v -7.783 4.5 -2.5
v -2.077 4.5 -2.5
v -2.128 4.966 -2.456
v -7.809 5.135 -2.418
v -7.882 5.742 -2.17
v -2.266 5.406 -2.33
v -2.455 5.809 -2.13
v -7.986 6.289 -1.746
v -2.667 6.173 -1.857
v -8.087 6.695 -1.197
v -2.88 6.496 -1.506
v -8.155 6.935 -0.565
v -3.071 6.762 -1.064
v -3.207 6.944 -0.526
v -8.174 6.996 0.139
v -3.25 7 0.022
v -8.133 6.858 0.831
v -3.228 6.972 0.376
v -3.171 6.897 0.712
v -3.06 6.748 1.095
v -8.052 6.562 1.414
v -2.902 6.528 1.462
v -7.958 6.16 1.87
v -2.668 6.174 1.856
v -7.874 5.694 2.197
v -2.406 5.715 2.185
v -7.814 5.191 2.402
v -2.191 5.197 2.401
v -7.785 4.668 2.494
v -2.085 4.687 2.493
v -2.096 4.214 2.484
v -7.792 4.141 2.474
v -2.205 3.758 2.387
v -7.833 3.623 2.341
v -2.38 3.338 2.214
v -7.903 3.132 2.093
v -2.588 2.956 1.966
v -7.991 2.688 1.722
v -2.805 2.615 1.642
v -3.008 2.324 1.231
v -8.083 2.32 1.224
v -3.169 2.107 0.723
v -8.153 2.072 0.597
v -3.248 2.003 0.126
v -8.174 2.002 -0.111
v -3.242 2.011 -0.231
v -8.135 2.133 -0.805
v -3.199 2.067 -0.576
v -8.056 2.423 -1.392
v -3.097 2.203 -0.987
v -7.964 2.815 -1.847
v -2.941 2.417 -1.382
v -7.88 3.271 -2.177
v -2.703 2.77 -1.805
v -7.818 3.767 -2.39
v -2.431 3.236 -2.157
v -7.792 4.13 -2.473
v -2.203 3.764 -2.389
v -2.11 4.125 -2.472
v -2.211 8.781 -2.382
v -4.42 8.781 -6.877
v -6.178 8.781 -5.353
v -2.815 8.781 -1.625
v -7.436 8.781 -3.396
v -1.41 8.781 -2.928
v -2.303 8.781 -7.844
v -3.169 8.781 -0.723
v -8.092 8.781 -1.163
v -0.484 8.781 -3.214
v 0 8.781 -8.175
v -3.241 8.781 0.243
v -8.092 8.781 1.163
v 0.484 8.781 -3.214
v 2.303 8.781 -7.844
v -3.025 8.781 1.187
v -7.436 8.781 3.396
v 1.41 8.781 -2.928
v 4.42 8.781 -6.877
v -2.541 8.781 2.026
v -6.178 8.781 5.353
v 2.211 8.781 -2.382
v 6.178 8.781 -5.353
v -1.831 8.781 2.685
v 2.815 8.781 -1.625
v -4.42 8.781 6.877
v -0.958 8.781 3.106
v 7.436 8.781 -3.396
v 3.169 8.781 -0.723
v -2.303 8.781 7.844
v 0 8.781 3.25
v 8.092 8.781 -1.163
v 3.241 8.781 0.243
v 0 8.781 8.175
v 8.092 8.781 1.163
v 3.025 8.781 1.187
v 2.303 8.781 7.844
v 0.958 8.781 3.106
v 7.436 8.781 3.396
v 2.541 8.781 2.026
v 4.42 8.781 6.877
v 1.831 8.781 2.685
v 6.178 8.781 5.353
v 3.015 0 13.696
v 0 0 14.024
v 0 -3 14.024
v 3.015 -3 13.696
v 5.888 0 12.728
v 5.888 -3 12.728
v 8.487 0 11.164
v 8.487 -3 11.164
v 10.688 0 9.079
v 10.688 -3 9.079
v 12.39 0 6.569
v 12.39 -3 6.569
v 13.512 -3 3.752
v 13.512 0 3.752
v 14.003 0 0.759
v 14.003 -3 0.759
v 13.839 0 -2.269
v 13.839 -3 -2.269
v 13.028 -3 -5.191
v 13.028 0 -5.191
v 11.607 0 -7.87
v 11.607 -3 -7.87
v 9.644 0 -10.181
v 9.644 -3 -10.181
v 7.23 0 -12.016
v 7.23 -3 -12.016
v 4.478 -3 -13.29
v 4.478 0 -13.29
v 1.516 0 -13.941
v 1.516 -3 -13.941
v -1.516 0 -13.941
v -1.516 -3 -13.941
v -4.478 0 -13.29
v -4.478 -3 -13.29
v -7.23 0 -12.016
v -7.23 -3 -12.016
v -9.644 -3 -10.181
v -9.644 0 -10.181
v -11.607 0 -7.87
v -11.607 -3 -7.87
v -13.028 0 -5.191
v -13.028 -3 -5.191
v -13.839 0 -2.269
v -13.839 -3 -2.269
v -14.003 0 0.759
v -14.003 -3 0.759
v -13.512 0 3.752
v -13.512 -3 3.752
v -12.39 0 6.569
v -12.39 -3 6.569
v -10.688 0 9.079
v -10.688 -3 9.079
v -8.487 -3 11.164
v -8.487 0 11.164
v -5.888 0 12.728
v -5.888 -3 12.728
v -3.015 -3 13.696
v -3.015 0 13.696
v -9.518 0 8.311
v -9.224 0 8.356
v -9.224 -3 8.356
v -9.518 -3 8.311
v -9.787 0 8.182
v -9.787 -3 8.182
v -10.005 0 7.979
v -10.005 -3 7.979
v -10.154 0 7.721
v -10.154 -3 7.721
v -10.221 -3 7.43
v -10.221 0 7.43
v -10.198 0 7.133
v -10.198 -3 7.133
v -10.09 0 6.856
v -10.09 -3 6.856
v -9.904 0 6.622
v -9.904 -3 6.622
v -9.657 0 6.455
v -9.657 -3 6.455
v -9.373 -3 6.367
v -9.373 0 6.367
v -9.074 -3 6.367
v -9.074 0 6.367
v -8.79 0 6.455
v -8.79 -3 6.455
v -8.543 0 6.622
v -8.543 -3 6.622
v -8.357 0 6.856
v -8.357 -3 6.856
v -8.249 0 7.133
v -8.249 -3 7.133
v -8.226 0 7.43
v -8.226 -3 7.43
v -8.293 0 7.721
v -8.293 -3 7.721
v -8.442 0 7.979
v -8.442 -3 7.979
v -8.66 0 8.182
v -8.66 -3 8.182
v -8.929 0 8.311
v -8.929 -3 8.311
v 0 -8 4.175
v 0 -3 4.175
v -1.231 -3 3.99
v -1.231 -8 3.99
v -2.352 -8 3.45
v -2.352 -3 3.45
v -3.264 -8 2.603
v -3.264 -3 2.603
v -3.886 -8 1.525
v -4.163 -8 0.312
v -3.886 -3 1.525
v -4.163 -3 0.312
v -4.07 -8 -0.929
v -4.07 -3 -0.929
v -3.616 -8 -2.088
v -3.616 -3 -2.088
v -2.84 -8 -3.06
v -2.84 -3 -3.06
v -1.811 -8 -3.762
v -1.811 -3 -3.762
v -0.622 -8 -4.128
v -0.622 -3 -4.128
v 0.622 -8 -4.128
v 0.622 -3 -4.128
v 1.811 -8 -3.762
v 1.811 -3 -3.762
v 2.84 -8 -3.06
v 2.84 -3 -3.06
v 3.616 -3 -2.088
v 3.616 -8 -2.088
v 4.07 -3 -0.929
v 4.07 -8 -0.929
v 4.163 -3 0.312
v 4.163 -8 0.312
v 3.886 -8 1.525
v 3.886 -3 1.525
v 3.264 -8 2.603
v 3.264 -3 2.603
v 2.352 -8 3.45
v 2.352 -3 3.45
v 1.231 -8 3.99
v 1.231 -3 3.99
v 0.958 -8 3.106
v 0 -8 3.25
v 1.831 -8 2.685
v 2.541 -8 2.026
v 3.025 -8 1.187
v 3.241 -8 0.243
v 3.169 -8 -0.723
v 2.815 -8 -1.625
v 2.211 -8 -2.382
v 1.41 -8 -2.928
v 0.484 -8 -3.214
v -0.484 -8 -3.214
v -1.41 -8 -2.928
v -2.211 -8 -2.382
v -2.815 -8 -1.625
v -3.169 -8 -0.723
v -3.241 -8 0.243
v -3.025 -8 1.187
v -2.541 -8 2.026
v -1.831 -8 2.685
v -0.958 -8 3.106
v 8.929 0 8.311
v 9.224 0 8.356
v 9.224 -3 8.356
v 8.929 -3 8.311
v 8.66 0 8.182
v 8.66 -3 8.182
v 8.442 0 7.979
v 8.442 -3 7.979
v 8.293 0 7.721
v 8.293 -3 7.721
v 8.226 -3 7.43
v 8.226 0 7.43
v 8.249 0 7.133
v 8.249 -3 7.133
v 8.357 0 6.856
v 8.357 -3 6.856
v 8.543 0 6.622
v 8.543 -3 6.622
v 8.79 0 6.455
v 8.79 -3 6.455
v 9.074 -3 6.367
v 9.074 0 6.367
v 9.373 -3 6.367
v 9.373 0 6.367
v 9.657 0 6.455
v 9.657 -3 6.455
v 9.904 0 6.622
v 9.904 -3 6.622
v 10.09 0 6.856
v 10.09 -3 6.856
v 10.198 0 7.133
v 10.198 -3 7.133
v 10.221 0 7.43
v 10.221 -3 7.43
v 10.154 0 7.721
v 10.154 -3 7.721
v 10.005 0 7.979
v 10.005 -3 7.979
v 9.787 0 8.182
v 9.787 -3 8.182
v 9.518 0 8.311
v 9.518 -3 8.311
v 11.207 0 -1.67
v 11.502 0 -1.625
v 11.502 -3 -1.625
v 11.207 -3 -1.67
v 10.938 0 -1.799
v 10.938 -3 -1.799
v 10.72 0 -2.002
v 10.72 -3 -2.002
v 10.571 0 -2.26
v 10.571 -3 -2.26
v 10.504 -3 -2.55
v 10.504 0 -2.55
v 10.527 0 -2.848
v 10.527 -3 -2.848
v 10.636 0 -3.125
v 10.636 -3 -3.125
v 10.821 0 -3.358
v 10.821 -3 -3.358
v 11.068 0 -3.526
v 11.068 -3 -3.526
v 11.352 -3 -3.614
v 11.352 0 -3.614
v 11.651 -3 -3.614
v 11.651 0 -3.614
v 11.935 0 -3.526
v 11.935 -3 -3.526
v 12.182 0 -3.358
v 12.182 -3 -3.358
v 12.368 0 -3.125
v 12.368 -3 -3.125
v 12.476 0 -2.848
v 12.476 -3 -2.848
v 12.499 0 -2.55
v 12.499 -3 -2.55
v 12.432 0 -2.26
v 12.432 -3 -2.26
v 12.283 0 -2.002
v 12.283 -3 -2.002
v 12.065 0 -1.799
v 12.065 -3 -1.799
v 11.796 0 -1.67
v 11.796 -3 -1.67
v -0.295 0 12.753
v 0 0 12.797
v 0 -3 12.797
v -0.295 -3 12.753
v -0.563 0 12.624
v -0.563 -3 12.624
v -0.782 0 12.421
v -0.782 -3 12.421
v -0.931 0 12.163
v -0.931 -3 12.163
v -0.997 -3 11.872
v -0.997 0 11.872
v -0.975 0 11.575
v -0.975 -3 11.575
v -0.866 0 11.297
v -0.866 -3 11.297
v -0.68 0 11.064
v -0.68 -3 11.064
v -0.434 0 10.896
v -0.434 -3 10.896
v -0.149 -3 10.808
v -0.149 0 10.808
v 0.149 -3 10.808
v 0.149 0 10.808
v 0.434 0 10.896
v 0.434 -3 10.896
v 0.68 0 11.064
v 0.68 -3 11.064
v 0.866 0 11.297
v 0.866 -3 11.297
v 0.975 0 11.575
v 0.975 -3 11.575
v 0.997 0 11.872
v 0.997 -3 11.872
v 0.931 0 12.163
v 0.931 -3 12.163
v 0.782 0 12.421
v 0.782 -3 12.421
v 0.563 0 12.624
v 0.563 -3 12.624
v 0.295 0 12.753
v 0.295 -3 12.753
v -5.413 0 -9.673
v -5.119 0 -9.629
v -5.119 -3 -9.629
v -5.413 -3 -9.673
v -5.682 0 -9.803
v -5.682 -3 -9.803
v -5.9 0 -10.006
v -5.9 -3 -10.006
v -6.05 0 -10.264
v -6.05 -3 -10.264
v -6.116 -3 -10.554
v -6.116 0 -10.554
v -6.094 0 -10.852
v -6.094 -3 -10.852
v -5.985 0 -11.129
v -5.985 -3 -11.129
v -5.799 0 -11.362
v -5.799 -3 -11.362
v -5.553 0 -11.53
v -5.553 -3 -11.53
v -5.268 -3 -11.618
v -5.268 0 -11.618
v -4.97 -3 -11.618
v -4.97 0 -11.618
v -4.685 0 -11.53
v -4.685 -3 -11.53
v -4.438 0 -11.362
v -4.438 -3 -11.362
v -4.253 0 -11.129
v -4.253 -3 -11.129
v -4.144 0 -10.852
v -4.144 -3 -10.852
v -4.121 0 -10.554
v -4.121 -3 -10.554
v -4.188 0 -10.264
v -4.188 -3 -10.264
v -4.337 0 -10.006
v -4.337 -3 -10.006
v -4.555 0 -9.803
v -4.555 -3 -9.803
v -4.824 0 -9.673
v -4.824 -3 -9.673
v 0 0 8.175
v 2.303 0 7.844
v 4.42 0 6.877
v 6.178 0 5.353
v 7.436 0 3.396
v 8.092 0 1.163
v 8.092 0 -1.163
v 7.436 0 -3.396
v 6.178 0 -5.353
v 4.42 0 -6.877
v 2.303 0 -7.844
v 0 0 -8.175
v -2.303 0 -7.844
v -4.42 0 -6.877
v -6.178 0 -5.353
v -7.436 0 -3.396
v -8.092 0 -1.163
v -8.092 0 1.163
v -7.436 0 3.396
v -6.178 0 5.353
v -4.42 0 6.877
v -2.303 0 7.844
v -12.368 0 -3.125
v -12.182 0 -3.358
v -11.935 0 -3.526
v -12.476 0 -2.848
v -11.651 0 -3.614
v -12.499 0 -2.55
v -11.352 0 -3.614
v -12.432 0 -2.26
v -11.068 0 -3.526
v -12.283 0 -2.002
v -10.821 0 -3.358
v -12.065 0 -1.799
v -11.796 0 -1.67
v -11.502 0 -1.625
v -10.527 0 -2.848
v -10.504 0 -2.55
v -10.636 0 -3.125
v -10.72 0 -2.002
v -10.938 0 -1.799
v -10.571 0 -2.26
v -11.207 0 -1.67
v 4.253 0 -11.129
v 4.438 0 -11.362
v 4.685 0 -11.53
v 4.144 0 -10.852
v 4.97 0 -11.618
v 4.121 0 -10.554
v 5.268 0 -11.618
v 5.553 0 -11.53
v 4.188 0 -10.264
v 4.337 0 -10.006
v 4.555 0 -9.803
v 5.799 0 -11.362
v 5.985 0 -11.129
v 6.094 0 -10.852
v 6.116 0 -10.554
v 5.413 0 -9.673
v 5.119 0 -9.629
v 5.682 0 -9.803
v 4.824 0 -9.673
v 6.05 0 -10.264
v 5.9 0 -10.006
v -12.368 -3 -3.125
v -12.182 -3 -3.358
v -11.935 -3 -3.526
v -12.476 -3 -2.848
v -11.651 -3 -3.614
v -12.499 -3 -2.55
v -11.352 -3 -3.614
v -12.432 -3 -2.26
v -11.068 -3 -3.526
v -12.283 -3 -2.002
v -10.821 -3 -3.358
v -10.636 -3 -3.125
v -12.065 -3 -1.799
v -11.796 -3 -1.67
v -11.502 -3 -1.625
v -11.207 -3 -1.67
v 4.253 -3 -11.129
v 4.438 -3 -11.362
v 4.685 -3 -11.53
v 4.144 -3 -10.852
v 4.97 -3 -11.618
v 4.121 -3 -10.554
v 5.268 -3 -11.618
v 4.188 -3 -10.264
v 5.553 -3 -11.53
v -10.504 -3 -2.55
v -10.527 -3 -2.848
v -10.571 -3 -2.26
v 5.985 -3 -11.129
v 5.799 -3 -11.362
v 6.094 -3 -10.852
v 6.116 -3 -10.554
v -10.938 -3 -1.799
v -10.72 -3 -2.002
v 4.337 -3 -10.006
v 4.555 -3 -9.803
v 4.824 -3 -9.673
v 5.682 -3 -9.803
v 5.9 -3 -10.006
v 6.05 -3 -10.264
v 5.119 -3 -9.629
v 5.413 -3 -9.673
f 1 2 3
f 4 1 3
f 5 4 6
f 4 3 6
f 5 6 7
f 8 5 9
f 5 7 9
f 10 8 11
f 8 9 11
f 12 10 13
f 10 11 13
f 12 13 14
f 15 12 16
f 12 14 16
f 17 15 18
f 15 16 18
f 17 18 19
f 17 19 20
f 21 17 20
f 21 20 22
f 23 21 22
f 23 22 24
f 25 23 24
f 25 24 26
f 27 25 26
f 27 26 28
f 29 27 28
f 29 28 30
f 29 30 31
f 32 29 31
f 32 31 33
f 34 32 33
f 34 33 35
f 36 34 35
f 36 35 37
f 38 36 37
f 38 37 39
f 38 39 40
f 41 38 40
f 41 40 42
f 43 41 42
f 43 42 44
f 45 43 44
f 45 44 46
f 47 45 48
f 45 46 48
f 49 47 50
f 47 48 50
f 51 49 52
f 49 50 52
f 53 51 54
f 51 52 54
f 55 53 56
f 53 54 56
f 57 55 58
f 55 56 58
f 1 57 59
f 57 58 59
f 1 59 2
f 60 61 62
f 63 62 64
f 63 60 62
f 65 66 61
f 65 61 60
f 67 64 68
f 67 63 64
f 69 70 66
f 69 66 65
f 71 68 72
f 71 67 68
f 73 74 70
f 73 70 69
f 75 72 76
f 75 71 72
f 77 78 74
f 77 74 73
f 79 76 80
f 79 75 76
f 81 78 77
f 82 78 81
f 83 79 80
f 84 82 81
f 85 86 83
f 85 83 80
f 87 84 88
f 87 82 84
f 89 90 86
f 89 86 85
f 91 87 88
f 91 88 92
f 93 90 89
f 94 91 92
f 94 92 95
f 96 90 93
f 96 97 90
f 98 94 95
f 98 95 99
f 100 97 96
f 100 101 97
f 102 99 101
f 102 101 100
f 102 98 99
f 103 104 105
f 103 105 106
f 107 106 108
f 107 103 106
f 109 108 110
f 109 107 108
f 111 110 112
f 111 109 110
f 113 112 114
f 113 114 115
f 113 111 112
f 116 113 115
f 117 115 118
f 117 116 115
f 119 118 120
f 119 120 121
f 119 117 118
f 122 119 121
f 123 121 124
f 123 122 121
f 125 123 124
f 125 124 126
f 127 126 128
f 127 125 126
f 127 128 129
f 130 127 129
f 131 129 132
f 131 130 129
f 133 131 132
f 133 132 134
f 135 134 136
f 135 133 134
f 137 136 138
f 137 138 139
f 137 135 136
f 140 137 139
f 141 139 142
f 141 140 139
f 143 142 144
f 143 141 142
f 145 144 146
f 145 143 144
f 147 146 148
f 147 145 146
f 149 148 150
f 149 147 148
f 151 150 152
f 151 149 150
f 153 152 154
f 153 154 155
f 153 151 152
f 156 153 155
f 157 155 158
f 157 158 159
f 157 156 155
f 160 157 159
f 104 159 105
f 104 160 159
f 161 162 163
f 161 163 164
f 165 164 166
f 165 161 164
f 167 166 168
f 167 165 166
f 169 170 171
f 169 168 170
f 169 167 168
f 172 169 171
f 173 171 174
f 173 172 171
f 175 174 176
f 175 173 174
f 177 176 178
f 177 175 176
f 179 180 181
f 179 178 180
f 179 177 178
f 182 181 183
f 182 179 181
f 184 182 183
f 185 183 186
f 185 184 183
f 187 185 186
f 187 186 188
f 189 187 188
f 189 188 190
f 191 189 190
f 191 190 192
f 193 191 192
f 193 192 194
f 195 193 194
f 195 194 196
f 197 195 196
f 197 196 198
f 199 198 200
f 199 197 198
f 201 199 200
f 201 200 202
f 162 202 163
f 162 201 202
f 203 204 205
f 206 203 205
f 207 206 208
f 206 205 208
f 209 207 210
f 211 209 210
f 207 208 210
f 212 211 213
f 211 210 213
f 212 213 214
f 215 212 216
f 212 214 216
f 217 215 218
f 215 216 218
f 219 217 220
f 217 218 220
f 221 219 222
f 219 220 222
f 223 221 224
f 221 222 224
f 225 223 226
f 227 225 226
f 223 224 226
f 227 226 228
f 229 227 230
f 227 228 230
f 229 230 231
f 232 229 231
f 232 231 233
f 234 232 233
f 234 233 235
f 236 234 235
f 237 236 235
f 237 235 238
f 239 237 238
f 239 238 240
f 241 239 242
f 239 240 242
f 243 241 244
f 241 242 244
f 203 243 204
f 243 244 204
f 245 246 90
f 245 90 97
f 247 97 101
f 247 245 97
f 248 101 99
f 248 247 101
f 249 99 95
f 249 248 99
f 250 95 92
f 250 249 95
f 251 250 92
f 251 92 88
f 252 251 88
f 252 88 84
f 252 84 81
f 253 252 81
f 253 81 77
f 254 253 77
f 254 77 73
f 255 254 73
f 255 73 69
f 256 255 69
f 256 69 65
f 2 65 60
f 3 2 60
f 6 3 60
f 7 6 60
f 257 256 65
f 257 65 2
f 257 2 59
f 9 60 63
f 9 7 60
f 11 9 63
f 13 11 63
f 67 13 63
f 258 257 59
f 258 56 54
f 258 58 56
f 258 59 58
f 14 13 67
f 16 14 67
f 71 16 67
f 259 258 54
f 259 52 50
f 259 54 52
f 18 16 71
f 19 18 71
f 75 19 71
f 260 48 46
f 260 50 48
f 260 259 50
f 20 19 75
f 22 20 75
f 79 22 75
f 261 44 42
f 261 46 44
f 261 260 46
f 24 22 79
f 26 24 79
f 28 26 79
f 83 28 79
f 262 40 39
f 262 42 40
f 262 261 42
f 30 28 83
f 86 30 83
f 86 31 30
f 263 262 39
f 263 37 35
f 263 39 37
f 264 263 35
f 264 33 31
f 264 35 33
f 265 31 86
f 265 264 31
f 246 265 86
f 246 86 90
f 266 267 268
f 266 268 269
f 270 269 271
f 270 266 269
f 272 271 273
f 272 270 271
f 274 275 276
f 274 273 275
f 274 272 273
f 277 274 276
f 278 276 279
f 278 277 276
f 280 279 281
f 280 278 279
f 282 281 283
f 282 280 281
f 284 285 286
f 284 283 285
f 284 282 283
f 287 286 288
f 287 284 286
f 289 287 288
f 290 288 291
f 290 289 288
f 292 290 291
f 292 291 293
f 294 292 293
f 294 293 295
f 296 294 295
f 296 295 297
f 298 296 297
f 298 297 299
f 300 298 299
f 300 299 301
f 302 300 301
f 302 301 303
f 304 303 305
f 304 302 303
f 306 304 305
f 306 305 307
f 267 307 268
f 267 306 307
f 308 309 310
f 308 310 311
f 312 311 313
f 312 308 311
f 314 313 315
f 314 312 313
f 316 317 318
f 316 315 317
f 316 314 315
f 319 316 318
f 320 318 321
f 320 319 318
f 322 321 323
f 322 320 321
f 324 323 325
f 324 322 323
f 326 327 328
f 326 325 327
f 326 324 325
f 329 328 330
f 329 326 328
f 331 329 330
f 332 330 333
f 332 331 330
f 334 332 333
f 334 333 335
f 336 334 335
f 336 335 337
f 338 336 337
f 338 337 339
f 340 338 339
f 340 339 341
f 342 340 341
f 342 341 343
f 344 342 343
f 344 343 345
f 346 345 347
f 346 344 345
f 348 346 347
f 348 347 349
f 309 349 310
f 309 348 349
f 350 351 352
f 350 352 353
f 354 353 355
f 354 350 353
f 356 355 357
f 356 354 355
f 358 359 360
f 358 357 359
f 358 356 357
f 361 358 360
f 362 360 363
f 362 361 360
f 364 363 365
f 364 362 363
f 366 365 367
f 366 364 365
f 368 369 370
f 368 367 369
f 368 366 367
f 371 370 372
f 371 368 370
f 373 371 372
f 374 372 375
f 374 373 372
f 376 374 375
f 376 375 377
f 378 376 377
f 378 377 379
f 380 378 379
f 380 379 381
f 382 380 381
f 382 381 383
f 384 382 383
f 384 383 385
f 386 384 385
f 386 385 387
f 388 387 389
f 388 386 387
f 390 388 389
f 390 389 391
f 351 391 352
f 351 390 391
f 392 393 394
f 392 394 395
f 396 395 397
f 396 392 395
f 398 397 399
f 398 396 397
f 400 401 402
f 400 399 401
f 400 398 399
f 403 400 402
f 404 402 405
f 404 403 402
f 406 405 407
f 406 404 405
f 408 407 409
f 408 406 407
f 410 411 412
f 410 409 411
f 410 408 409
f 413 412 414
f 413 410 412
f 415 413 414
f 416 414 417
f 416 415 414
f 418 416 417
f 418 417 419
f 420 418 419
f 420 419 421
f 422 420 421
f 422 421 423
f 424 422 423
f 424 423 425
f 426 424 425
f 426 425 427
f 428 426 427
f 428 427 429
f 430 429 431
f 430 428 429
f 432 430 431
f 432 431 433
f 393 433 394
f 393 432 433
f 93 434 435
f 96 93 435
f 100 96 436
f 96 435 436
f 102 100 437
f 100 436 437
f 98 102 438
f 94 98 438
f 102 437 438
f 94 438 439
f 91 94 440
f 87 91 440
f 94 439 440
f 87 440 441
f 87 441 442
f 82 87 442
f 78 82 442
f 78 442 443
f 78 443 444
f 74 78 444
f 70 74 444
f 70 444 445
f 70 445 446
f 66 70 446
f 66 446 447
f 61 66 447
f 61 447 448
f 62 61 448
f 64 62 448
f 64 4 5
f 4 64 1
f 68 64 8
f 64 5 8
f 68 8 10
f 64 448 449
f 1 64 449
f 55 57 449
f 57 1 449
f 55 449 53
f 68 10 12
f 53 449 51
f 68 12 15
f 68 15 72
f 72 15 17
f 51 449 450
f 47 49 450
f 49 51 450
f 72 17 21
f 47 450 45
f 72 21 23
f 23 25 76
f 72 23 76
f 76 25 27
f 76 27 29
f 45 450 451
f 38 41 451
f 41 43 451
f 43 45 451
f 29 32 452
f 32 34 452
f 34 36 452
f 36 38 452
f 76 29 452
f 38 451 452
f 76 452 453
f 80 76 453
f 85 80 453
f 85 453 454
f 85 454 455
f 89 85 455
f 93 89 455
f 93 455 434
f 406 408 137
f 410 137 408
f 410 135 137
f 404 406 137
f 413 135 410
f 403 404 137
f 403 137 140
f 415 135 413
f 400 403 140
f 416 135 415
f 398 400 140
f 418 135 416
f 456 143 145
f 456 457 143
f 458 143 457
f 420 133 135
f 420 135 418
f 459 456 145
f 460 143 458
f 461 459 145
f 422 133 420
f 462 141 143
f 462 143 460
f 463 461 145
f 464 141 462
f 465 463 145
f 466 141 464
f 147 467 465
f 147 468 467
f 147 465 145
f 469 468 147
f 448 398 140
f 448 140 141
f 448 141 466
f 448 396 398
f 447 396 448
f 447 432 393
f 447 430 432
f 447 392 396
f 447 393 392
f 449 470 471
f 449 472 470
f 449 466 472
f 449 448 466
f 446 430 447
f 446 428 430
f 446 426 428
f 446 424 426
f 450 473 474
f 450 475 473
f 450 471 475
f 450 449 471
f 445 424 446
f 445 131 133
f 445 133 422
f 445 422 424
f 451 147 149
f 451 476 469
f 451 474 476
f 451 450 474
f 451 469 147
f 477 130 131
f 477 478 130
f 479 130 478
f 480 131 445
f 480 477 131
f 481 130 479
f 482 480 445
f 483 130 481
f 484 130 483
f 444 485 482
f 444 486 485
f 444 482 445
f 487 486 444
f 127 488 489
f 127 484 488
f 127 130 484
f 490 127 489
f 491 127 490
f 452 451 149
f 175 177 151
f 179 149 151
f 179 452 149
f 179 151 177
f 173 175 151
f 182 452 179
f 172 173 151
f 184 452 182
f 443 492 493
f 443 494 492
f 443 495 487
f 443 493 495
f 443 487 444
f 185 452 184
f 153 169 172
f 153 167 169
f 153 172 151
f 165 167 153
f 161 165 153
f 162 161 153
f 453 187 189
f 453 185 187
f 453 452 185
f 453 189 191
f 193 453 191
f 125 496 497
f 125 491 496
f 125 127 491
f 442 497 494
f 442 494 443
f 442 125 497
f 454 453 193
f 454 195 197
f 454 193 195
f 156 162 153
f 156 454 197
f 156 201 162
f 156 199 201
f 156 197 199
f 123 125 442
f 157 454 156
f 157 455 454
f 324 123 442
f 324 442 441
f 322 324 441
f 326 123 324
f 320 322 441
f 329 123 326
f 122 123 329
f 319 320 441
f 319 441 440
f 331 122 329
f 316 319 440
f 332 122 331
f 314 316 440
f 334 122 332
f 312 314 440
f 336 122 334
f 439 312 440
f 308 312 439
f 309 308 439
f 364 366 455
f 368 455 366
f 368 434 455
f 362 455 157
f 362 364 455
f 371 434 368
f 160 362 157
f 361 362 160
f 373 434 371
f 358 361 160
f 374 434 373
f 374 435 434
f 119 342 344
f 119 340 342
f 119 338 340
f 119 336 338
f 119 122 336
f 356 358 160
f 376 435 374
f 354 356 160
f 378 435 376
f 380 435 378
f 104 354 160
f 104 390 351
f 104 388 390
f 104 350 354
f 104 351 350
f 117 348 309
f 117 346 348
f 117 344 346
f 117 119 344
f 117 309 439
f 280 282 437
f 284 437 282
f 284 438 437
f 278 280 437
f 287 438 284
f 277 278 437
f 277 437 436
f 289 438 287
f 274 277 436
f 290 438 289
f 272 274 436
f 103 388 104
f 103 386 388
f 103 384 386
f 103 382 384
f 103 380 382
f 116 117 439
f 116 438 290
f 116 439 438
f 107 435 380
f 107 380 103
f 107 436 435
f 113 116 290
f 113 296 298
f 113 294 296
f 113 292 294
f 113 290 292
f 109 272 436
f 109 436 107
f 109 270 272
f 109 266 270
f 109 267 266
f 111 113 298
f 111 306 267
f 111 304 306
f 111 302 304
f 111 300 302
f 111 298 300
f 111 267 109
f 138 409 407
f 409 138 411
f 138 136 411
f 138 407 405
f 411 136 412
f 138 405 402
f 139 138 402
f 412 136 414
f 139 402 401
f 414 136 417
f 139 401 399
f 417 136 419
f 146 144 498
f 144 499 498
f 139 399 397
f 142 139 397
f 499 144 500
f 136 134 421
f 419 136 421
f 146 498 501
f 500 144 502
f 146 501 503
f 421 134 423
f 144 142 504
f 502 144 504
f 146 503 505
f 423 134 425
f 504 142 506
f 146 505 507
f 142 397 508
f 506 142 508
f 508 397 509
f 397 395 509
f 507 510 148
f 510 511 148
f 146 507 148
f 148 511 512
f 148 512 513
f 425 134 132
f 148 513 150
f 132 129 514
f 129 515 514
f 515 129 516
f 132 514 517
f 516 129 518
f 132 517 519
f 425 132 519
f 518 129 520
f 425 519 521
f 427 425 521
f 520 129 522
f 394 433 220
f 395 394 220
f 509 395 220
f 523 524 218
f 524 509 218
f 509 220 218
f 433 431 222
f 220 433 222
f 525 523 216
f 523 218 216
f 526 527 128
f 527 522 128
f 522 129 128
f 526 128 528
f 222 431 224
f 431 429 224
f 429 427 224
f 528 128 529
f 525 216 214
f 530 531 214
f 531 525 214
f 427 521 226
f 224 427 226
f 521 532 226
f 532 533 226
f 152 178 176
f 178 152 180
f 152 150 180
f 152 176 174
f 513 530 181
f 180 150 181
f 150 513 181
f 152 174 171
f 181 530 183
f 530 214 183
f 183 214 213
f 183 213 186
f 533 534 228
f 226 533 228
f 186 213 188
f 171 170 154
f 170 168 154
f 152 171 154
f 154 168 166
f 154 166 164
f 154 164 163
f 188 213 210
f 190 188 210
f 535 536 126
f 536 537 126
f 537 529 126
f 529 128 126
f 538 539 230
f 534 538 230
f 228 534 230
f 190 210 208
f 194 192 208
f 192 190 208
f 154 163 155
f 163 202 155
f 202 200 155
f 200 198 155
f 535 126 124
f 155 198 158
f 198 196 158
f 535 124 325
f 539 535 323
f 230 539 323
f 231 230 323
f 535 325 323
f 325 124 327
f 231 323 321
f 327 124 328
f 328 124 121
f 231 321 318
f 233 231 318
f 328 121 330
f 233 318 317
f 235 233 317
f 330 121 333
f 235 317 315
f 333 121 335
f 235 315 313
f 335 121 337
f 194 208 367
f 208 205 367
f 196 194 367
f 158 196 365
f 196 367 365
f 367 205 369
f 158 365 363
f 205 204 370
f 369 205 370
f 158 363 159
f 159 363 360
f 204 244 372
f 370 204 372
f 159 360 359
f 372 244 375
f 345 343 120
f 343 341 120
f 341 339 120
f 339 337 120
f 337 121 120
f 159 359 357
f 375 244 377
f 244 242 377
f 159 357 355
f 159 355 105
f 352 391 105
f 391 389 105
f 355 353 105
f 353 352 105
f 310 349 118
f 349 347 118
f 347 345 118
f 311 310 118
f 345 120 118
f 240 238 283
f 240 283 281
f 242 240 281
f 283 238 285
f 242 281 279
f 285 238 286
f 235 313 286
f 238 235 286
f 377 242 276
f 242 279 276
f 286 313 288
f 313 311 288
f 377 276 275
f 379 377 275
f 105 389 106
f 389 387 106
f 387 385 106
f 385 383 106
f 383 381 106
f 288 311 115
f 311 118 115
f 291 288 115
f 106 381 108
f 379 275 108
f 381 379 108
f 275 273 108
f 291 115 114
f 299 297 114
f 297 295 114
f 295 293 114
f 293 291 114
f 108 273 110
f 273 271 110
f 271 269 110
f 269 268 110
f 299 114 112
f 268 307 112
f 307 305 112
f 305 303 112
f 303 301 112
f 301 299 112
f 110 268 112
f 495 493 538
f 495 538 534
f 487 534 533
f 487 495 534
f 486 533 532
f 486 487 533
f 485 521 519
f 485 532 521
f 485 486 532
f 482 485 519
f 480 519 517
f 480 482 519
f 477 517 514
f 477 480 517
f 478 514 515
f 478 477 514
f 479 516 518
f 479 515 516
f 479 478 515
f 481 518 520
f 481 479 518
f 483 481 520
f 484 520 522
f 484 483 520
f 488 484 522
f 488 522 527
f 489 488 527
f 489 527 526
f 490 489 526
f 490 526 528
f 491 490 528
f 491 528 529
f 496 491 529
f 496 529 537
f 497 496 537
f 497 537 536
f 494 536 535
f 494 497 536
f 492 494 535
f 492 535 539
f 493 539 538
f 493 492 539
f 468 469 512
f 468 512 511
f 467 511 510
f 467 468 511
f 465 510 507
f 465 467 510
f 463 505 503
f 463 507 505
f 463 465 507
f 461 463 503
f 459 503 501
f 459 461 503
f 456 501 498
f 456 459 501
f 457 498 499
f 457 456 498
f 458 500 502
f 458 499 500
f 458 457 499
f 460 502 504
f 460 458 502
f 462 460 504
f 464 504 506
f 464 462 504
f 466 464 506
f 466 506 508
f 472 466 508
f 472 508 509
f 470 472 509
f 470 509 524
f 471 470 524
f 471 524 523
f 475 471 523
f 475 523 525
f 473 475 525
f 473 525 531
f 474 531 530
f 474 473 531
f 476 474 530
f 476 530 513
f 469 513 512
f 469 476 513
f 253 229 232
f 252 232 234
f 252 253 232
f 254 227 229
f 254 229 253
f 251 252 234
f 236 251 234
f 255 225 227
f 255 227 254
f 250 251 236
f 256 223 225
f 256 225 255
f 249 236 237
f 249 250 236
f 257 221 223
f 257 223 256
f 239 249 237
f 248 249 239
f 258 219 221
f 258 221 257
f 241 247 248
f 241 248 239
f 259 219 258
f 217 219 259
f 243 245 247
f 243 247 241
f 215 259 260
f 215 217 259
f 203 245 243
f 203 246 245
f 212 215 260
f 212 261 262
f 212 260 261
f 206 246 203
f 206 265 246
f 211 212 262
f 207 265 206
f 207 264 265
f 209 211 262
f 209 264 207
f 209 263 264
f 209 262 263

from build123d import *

# Parameters (mm, degrees)
BOSS_EXTRUDE1_DEPTH      = 8.7806917
BOSS_EXTRUDE1_DEPTH_BACK = 3
SKETCH1_R                = 8.175
SKETCH1_R_2              = 3.25
SKETCH1_3_R              = 14.023642089
SKETCH1_3_R_2            = 8.175
BOSS_EXTRUDE2_DEPTH      = 3
SKETCH2_R                = 2.5
CUT_EXTRUDE1_DEPTH       = 15
CUT_EXTRUDE2_DEPTH       = 3.175
CUT_EXTRUDE2_DEPTH_BACK  = 24.067504724
SKETCH3_R                = 1
SKETCH4_R                = 4.175
BOSS_EXTRUDE4_DEPTH      = 5
CUT_EXTRUDE3_DEPTH       = 15
CUT_EXTRUDE3_DEPTH_BACK  = 13
SKETCH1_5_R              = 3.25


with BuildPart() as part:
    # Sketch1 → Boss-Extrude1 (new, two sides: drawn at the far end of the back side and taken through both)
    with BuildSketch(Plane(origin=(0, 0, 0), x_dir=(1, 0, 0), z_dir=(0, 1, 0)).offset(-BOSS_EXTRUDE1_DEPTH_BACK)):
        Circle(SKETCH1_R)
        Circle(SKETCH1_R_2, mode=Mode.SUBTRACT)
    extrude(amount=BOSS_EXTRUDE1_DEPTH + BOSS_EXTRUDE1_DEPTH_BACK)

    # Sketch2 → Cut-Extrude1 (cut)
    with BuildSketch(Plane(origin=(0, 0, 0), x_dir=(0, 0, -1), z_dir=(1, 0, 0))):
        with Locations((0, 4.5)):
            Circle(SKETCH2_R)
    extrude(amount=-CUT_EXTRUDE1_DEPTH, mode=Mode.SUBTRACT)



with BuildPart() as body_2:
    # Sketch1<3> → Boss-Extrude2 (new body)
    with BuildSketch(Plane(origin=(0, 0, 0), x_dir=(1, 0, 0), z_dir=(0, 1, 0))):
        Circle(SKETCH1_3_R)
        Circle(SKETCH1_3_R_2, mode=Mode.SUBTRACT)
    extrude(amount=-BOSS_EXTRUDE2_DEPTH)

    # Sketch3 → Cut-Extrude2 (cut, two sides: drawn at the far end of the back side and taken through both)
    with BuildSketch(Plane.XZ.offset(3).offset(-CUT_EXTRUDE2_DEPTH_BACK)):
        with Locations((0, 11.797323524)):
            Circle(SKETCH3_R)
        with Locations((9.22351894, 7.355510906)):
            Circle(SKETCH3_R)
        with Locations((11.501539993, -2.625151449)):
            Circle(SKETCH3_R)
        with Locations((5.118666842, -10.62902122)):
            Circle(SKETCH3_R)
        with Locations((-5.118666842, -10.62902122)):
            Circle(SKETCH3_R)
        with Locations((-11.501539993, -2.625151449)):
            Circle(SKETCH3_R)
        with Locations((-9.22351894, 7.355510906)):
            Circle(SKETCH3_R)
    extrude(amount=CUT_EXTRUDE2_DEPTH + CUT_EXTRUDE2_DEPTH_BACK, mode=Mode.SUBTRACT)


with BuildPart() as part_1:
    add(part.part)

    add(body_2.part)  # Boss-Extrude4 merges body 2
    # Sketch4 → Boss-Extrude4 (add)
    with BuildSketch(Plane.XZ.offset(3)):
        Circle(SKETCH4_R)
    extrude(amount=BOSS_EXTRUDE4_DEPTH)

    # Sketch1<5> → Cut-Extrude3 (cut, two sides: drawn at the far end of the back side and taken through both)
    with BuildSketch(Plane(origin=(0, 0, 0), x_dir=(1, 0, 0), z_dir=(0, 1, 0)).offset(-CUT_EXTRUDE3_DEPTH_BACK)):
        Circle(SKETCH1_5_R)
    extrude(amount=CUT_EXTRUDE3_DEPTH + CUT_EXTRUDE3_DEPTH_BACK, mode=Mode.SUBTRACT)


solid = part_1.part
